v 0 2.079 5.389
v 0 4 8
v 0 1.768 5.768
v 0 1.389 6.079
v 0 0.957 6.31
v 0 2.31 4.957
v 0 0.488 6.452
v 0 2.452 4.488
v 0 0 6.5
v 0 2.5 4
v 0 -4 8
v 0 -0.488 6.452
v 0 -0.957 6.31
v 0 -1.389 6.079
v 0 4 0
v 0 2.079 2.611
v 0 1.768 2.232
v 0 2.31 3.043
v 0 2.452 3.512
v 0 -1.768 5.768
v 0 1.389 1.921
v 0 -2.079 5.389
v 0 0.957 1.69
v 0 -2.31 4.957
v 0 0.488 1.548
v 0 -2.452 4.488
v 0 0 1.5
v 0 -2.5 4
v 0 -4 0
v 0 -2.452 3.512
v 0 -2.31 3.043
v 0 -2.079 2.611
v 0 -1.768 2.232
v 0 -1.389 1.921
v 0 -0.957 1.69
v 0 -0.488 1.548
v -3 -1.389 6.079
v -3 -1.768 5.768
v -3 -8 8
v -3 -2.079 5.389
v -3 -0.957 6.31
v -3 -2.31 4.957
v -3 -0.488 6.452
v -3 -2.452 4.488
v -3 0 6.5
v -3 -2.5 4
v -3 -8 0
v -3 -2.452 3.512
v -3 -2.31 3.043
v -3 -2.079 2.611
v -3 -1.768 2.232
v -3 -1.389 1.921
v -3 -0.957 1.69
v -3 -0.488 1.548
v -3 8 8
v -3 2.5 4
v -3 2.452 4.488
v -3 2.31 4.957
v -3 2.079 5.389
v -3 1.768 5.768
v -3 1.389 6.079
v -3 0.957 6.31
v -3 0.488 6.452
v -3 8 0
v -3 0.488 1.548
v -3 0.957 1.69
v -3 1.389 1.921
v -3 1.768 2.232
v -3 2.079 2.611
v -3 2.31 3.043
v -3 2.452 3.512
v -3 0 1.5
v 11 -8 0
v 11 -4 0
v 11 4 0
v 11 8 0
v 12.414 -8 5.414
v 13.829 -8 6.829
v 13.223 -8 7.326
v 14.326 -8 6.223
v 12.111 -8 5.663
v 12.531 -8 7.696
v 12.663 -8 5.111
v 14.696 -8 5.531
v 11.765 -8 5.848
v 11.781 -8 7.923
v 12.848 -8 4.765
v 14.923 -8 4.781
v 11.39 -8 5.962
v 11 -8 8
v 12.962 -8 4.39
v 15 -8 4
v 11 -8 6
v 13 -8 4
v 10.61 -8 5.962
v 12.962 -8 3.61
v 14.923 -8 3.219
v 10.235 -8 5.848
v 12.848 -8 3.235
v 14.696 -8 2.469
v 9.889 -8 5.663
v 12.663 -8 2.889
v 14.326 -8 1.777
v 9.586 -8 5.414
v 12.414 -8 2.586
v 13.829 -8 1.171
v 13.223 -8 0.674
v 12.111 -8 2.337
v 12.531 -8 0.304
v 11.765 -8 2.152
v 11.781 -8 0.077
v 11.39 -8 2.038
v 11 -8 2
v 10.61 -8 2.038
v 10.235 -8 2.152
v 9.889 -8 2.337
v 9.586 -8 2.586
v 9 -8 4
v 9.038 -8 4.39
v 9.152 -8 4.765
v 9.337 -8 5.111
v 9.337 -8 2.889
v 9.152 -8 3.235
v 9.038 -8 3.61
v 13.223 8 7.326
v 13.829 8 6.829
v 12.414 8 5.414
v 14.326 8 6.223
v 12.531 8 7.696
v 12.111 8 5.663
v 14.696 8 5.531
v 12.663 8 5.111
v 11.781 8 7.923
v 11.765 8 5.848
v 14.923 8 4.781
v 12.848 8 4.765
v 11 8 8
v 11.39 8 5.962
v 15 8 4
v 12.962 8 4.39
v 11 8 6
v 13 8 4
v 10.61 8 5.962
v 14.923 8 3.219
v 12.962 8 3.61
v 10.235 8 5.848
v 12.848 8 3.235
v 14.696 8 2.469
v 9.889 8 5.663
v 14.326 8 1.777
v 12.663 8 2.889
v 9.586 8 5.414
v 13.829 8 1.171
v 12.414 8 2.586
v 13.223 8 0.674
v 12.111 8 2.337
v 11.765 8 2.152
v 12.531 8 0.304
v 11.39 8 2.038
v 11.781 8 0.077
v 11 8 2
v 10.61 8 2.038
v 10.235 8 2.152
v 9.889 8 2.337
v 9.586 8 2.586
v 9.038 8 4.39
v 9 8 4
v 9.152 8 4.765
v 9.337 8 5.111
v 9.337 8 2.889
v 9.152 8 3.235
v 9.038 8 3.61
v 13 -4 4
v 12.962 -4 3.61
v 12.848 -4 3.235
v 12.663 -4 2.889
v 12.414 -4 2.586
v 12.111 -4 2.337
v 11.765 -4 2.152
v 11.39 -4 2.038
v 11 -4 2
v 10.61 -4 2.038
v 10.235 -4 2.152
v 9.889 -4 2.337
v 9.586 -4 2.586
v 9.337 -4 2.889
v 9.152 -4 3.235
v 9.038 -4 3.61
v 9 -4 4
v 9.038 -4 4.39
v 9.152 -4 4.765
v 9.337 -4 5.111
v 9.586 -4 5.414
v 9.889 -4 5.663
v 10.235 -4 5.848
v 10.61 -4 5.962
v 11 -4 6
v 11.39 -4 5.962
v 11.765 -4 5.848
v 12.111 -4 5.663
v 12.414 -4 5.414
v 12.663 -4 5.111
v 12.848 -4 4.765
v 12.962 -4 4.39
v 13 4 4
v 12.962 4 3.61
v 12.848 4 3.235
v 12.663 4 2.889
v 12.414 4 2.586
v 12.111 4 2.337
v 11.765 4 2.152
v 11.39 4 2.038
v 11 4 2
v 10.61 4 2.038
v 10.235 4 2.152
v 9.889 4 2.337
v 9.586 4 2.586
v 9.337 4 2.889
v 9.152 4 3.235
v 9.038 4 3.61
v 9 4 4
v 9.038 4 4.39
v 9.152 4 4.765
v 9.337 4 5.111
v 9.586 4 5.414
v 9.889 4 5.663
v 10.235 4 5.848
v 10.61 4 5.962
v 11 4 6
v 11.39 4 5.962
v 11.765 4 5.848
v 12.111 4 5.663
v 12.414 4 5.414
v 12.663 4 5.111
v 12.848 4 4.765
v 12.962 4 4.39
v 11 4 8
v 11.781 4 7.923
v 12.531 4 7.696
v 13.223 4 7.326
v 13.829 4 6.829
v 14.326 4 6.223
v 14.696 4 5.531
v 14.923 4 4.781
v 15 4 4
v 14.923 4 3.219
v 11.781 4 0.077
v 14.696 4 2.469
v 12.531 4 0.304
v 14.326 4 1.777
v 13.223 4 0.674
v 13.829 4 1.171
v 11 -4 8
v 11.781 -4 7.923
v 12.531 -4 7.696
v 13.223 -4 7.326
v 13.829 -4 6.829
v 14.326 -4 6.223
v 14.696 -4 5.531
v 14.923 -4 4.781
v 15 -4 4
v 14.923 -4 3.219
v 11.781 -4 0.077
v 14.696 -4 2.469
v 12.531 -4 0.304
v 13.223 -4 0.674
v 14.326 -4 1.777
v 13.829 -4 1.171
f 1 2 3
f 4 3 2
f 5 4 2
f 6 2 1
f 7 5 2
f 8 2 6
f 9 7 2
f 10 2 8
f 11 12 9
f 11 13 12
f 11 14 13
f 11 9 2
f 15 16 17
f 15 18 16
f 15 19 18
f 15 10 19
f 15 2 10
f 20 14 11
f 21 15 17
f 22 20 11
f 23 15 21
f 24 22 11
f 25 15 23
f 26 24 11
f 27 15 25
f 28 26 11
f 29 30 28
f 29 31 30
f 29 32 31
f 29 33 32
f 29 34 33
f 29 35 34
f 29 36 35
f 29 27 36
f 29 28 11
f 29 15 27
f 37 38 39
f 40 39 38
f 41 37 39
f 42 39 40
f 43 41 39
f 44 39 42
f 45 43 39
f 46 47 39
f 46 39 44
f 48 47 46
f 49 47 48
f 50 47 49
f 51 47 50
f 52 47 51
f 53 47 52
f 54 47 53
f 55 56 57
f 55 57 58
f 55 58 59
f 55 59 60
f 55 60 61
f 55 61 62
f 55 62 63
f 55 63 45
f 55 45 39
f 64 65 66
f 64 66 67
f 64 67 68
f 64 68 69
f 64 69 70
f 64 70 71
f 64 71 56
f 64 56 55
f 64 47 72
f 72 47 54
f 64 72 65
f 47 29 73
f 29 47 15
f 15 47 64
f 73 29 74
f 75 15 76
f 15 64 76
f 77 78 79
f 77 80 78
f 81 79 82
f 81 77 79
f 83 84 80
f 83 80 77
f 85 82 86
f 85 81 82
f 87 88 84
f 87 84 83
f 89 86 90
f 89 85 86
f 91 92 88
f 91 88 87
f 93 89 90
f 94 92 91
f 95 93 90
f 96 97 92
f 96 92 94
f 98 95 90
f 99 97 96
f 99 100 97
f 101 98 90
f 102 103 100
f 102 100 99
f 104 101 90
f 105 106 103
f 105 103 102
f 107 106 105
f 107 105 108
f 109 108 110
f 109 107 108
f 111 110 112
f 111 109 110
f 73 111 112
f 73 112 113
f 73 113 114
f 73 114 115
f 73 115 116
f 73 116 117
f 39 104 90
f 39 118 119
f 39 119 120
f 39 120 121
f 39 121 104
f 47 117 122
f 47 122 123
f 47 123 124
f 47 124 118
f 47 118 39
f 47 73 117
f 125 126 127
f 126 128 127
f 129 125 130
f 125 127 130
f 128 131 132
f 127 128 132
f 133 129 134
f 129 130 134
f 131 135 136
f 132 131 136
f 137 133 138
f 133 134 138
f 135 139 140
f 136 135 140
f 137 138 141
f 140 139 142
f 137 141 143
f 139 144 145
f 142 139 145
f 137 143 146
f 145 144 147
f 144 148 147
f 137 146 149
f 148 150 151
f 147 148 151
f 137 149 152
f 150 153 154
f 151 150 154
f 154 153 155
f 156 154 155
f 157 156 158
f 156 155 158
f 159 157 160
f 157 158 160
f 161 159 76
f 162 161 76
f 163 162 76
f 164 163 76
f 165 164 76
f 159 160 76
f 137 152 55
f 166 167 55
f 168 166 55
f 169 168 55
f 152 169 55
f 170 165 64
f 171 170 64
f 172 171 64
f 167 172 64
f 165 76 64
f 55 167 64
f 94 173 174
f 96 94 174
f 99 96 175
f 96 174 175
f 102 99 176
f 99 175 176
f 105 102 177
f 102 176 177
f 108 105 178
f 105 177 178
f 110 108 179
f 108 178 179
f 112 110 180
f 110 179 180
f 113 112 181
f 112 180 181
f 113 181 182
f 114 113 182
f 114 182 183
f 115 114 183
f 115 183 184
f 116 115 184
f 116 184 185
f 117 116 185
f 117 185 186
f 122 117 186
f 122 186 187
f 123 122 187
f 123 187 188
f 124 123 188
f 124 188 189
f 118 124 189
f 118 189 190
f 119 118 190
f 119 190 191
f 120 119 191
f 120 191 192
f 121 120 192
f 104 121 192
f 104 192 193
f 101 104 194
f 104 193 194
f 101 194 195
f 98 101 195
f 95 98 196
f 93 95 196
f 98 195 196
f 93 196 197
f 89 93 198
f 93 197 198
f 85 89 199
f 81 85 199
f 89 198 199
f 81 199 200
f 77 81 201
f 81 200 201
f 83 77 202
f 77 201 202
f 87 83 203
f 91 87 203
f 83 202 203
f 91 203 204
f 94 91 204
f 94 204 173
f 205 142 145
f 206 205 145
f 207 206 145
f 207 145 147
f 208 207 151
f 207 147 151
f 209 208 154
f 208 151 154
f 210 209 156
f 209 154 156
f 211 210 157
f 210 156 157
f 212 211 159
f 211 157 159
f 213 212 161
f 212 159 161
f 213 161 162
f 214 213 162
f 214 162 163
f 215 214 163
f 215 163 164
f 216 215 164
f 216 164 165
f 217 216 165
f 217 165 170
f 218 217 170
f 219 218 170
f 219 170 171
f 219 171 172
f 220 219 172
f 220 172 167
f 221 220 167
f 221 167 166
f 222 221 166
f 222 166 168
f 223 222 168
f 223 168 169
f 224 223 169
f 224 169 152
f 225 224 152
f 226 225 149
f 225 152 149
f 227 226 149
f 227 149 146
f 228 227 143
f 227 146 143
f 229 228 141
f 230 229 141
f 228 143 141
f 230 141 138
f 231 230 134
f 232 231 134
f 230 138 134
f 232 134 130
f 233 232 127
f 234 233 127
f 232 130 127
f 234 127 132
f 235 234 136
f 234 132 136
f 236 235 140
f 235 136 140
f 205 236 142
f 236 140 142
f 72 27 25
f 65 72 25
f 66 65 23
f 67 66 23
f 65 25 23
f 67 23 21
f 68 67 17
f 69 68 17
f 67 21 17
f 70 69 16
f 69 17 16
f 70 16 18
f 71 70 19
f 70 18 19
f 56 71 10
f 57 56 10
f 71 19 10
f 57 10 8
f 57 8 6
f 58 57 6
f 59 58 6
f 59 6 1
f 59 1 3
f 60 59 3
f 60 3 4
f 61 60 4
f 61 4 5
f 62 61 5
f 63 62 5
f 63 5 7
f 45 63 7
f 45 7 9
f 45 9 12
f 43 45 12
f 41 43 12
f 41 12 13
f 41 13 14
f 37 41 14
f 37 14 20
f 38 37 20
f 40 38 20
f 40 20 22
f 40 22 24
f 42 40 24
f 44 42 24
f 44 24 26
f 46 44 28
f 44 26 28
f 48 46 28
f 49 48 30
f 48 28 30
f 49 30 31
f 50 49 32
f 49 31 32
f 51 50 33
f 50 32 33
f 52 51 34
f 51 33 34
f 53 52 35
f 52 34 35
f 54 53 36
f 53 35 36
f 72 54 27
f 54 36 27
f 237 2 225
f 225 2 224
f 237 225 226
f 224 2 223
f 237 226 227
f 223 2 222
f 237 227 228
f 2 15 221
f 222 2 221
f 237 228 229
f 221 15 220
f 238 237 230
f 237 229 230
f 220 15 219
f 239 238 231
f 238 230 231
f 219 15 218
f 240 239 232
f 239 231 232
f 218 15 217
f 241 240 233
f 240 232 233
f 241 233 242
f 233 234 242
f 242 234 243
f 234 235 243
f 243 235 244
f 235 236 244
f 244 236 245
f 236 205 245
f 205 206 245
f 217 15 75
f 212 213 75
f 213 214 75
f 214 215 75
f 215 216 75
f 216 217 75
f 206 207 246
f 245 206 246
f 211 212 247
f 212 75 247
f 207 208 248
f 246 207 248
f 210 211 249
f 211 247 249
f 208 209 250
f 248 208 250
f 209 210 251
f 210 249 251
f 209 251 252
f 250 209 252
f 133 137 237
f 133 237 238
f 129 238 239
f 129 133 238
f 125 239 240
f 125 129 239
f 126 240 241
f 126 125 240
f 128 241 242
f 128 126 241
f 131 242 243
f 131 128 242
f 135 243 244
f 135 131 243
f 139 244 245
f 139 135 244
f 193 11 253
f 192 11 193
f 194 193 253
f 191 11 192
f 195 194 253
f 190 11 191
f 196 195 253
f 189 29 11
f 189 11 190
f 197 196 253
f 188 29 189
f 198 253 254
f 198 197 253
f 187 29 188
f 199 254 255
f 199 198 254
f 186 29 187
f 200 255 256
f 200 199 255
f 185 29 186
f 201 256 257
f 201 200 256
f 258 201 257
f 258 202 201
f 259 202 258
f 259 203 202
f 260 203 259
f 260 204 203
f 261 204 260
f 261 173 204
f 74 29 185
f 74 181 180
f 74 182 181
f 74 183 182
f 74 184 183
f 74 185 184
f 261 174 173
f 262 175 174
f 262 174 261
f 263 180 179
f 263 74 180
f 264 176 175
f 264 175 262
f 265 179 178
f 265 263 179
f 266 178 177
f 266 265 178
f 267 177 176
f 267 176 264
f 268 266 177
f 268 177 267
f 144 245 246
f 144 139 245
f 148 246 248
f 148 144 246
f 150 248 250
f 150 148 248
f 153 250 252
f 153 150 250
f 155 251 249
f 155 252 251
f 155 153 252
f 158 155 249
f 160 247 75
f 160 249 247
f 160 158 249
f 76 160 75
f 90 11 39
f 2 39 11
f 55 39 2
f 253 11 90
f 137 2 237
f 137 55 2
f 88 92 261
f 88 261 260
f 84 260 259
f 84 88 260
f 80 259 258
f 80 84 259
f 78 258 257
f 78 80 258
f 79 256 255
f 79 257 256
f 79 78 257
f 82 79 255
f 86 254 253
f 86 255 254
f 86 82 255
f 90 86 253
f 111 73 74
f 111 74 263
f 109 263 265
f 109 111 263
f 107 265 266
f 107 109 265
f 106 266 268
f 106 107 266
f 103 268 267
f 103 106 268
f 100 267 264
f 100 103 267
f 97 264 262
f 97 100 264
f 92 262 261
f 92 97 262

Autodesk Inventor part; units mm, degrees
ref_plane "YZ Plane" through (0, 0, 0) normal (1, 0, 0) x (0, 1, 0)
ref_plane "XZ Plane" through (0, 0, 0) normal (0, 1, 0) x (-1, 0, 0)
ref_plane "XY Plane" through (0, 0, 0) normal (0, 0, 1) x (1, 0, 0)
sketch "Sketch1" plane through (0, 0, 0) normal (0, 0, 1) x (1, 0, 0)
  line L0 (0, 0) -> (0, 4)
  line L1 (0, 4) -> (15, 4)
  line L2 (15, 4) -> (15, 8)
  line L3 (15, 8) -> (-3, 8)
  line L4 (-3, 8) -> (-3, 0)
  line L5 (0, 0) -> (0, -4)
  line L6 (0, -4) -> (15, -4)
  line L7 (15, -4) -> (15, -8)
  line L8 (15, -8) -> (-3, -8)
  line L9 (-3, -8) -> (-3, 0)
  point P0 (0, 2)
  dimension "d4" = 3
  dimension "d5" = 4
  dimension "d17" = 15
extrude "Extrusion1" add sketch "Sketch1" along normal blind 8
sketch "Sketch2" plane through (-3, 8, 0) normal (0, 1, 0) x (1, 0, 0)
  circle A0 centre (14, -4) radius 2
  line L0 (18, 0) -> (18, -8) projected
  point P0 (3, 0)
  point P1 (18, -4)
  dimension "d8" = 4
  dimension "d9" = 4
extrude "Extrusion2" cut sketch "Sketch2" against normal through all
fillet "Fillet1" radius 4 4 edges at (15, 6, 8) (15, 6, 0) (15, -6, 8) (15, -6, 0)
sketch "Sketch3" plane through (0, -4, 0) normal (1, 0, 0) x (0, 0, -1)
  circle A0 centre (-4, 4) radius 2.5
  line L0 (0, 0) -> (0, 8) projected
  point P0 (0, 4)
  point P1 (0, 4)
  dimension "d13" = 5
  dimension "d14" = 4
extrude "Extrusion3" cut sketch "Sketch3" against normal blind 10
properties part number "actuator mount 2"
